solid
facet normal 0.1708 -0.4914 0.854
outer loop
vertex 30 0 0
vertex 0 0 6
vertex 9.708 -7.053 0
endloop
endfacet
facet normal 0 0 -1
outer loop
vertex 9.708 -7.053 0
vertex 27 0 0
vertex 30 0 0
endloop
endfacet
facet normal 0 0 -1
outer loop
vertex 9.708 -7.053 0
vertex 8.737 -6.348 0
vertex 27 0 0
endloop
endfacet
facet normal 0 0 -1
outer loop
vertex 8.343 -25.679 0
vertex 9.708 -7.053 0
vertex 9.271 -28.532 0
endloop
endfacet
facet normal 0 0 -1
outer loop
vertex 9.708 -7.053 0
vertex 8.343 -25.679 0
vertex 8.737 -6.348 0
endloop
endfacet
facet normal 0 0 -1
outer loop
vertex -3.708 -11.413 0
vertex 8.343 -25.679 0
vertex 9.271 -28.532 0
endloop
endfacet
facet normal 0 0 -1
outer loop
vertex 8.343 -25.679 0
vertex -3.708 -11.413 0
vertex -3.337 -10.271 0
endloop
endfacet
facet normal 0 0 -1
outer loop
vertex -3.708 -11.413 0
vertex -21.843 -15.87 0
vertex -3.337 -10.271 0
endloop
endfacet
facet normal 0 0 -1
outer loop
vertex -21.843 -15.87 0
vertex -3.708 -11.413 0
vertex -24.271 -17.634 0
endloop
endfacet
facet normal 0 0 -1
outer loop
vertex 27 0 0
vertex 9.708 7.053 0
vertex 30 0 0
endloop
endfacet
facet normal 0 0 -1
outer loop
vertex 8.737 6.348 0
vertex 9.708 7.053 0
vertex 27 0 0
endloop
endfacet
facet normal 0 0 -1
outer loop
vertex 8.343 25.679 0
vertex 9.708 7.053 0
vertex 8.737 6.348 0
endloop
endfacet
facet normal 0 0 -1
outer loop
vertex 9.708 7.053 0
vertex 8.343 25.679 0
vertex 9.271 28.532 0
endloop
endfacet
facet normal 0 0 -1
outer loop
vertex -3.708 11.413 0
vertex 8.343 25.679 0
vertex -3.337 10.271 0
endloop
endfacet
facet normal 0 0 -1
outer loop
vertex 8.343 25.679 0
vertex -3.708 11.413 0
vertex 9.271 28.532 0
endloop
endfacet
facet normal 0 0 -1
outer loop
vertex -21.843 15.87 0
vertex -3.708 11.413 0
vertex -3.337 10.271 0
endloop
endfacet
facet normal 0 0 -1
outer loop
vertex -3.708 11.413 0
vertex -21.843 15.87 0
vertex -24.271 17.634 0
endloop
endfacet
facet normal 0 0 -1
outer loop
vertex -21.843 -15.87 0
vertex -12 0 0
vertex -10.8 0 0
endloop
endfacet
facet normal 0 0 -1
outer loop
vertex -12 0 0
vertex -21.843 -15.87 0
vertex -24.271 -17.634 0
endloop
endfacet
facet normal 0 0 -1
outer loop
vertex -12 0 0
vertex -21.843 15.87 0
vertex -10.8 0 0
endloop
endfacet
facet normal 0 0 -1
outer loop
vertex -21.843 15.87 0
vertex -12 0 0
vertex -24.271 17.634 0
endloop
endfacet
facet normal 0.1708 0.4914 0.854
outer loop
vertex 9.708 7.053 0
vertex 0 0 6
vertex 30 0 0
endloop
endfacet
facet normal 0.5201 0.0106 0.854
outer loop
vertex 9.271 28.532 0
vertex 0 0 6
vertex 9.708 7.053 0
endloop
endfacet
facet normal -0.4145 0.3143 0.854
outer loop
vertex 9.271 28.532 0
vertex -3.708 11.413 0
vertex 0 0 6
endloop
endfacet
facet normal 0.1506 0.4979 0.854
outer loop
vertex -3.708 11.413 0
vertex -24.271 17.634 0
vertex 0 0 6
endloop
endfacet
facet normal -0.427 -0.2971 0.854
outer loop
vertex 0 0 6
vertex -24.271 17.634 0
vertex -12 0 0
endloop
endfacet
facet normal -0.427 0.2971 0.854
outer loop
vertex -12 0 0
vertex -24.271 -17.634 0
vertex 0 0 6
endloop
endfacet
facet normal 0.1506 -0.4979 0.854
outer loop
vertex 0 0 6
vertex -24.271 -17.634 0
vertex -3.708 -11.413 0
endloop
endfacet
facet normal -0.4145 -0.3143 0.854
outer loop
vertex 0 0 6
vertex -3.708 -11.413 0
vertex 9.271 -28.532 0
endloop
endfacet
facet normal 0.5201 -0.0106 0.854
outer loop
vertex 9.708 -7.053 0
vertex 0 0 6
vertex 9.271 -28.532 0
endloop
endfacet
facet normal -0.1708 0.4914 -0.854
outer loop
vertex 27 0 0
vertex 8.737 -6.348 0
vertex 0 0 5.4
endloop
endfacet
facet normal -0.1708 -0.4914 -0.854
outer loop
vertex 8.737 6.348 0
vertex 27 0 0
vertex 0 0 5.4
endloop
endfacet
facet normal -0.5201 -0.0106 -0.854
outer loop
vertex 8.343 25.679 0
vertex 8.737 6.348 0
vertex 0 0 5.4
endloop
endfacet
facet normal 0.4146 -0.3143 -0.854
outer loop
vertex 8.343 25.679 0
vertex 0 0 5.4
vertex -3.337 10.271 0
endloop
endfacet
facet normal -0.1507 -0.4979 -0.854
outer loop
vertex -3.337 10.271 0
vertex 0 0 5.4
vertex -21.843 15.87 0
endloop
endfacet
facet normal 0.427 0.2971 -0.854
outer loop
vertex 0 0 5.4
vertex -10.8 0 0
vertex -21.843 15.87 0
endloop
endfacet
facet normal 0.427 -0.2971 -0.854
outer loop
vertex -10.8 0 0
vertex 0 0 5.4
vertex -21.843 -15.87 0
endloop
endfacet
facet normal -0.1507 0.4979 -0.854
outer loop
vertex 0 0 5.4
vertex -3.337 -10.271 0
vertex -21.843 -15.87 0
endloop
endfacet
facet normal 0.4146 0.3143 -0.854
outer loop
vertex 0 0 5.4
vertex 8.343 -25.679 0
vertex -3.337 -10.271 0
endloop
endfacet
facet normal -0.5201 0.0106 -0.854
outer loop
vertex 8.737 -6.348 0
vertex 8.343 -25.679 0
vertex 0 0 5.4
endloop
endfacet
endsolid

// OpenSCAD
burst_r1 = 30;
burst_r2 = 12;
burst_number = 5;
burst_height = 6;
two_sides = "NO";
hollow = "YES";
inside_scale = 0.9;

module star(burst_r1, burst_r2, burst_number, burst_height) {
    a = 180 / burst_number;

    p0 = [0, 0, 0];
    p1 = [burst_r2 * cos(a), burst_r2 * sin(a), 0];
    p2 = [burst_r1, 0, 0];
    p3 = [0, 0, burst_height];

    module half_burst() {
        polyhedron(points = [p0, p1, p2, p3], 
            faces = [
                [0, 2, 1],
                [0, 1, 3],
                [0, 3, 2], 
                [2, 1, 3]
            ]
        );
    }

    module burst() {
        hull() {
            half_burst();
            mirror([0, 1,0]) half_burst();
        }
    }

    union() {
        for(i = [0 : burst_number - 1]) {
            rotate(2 * a * i) burst();
        }
    }
}

if(hollow == "YES") {
    difference() {
        star(burst_r1, burst_r2, burst_number, burst_height);
        scale(inside_scale) star(burst_r1, burst_r2, burst_number, burst_height);
    }
    if(two_sides == "YES") {
       mirror([0, 0, 1]) difference() {
          star(burst_r1, burst_r2, burst_number, burst_height);
          scale(inside_scale) star(burst_r1, burst_r2, burst_number, burst_height);
      }
    } 
} else {
    star(burst_r1, burst_r2, burst_number, burst_height);
    if(two_sides == "YES") {
       mirror([0, 0, 1]) star(burst_r1, burst_r2, burst_number, burst_height);
    } 
}
